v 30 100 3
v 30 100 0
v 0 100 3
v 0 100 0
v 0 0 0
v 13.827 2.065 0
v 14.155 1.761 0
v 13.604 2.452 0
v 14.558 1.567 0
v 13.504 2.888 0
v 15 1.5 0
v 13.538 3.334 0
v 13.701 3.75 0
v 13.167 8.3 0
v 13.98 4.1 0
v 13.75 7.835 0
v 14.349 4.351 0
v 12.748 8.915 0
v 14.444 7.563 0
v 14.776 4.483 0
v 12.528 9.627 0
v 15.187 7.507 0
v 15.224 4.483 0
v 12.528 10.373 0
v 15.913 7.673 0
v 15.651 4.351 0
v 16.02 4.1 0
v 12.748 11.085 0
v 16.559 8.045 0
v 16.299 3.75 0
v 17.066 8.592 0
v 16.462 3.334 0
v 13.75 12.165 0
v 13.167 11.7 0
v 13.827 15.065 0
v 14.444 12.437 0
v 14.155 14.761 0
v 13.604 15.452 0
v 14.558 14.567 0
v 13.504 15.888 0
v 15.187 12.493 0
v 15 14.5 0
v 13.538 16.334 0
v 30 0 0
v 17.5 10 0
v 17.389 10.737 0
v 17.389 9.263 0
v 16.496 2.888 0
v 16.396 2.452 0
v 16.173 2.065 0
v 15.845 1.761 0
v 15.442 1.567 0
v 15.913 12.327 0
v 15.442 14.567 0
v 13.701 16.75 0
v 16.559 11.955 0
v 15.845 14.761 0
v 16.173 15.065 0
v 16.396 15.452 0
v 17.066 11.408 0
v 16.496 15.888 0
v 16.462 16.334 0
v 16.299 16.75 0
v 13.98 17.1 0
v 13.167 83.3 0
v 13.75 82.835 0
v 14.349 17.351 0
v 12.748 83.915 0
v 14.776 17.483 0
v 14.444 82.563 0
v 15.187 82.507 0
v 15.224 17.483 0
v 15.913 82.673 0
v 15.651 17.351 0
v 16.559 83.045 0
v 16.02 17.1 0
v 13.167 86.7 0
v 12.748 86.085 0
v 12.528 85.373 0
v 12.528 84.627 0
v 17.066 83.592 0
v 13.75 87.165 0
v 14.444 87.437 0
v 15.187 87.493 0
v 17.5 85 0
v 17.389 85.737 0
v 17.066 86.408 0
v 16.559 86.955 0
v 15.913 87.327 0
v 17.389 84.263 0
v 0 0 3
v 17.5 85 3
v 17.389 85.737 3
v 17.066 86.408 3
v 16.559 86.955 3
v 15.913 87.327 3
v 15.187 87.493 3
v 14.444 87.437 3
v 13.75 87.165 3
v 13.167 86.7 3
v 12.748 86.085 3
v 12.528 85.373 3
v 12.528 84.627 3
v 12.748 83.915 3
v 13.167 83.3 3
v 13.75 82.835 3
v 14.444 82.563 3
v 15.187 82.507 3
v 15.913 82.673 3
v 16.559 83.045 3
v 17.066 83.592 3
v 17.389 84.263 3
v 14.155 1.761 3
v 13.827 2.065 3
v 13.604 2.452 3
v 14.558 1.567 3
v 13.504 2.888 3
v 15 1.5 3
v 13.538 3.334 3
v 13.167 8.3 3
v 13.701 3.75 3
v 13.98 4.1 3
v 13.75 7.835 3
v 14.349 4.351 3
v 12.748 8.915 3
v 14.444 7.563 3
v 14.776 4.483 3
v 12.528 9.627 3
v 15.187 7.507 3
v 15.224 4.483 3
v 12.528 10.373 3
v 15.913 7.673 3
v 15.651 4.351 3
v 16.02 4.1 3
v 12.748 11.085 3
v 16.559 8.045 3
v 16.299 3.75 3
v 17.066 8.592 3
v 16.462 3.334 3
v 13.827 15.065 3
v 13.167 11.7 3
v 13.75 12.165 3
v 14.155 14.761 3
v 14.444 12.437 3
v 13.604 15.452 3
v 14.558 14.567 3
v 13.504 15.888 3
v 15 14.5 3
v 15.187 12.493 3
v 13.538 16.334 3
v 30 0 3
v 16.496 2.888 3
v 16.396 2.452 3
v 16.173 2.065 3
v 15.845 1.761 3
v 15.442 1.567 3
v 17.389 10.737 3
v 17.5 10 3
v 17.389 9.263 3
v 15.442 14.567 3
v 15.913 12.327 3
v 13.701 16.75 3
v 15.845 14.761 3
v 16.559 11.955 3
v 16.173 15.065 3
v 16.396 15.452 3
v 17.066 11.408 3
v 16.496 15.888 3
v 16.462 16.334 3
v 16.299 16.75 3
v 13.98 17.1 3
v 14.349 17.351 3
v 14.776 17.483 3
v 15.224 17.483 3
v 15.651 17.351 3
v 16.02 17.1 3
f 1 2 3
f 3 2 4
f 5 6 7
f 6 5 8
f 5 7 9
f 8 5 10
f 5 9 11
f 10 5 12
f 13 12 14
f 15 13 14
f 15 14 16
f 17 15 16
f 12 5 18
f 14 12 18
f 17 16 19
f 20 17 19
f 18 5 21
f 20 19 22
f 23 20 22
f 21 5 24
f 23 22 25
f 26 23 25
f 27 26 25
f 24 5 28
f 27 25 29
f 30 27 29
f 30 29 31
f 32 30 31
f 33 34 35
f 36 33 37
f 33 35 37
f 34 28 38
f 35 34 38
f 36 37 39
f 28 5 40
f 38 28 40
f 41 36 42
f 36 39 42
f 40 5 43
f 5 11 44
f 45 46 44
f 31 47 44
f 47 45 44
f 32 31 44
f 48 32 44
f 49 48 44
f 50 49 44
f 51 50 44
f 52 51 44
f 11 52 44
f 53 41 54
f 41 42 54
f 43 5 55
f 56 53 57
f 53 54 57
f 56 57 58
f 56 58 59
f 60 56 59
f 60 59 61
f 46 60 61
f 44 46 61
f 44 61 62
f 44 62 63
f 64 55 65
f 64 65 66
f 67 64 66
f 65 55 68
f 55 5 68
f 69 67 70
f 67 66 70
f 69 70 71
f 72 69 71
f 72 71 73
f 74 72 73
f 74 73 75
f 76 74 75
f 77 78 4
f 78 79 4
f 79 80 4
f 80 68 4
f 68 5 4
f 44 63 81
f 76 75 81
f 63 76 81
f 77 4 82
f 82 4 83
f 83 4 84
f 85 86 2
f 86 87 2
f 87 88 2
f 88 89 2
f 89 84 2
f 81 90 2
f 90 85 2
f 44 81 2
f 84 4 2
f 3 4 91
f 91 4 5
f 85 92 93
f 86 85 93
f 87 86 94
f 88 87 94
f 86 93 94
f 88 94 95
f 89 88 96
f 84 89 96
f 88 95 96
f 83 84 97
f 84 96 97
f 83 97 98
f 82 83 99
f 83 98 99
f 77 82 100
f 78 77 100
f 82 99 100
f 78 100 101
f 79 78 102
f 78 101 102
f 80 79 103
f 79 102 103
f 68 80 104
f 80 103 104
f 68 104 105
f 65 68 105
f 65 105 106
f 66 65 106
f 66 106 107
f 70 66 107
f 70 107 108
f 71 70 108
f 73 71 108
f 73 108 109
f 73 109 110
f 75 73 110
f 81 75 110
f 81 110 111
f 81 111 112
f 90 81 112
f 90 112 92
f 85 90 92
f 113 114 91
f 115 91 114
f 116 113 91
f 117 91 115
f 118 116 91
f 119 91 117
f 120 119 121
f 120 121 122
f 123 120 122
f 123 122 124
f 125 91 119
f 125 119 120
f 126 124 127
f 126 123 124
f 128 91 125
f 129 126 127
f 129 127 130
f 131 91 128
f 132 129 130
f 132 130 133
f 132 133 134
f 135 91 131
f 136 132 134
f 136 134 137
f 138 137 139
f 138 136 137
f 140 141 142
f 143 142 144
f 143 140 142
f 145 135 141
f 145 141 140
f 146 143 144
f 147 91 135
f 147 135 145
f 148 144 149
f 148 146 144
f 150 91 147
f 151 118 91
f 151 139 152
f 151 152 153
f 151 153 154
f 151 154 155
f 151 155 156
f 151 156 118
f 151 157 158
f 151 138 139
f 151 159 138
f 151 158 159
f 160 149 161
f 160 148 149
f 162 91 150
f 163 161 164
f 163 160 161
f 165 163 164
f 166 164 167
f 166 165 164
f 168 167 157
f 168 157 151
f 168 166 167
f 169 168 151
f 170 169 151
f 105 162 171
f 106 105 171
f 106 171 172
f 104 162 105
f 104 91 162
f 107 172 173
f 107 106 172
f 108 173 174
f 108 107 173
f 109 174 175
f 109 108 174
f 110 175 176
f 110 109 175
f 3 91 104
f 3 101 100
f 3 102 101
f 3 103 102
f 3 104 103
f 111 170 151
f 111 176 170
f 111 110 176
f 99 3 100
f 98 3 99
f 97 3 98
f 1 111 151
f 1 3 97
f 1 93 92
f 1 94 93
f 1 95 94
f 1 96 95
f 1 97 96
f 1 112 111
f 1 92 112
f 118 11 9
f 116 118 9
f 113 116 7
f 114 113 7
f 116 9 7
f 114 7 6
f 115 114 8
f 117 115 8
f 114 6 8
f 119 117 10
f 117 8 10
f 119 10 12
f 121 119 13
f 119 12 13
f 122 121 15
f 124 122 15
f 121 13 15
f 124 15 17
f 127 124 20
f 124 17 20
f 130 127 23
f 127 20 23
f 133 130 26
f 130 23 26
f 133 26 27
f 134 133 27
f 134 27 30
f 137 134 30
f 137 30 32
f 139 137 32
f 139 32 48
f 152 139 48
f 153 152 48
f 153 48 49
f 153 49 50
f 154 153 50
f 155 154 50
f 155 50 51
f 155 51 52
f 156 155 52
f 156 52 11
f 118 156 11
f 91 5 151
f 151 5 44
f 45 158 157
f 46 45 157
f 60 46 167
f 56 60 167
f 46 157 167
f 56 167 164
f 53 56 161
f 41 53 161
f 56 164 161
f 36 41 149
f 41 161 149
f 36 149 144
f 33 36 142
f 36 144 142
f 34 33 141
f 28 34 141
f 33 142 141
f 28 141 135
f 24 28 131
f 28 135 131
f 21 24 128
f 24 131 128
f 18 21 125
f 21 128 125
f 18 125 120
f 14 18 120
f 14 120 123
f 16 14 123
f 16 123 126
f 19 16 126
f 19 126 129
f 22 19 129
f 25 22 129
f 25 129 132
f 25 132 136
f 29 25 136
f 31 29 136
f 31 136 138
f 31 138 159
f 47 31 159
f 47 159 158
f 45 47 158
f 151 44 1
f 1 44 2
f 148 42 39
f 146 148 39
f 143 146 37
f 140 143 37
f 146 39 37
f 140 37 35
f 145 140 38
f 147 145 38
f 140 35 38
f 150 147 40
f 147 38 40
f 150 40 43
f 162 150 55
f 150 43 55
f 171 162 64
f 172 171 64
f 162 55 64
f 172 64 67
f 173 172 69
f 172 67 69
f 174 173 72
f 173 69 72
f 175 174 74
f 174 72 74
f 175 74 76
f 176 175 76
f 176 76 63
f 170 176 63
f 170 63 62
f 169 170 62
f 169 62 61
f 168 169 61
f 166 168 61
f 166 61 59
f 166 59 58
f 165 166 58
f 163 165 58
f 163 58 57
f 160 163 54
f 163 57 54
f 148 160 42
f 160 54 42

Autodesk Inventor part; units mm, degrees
ref_plane "YZ Plane" through (0, 0, 0) normal (1, 0, 0) x (0, 1, 0)
ref_plane "XZ Plane" through (0, 0, 0) normal (0, 1, 0) x (-1, 0, 0)
ref_plane "XY Plane" through (0, 0, 0) normal (0, 0, 1) x (1, 0, 0)
sketch "スケッチ1" plane through (0, 0, 0) normal (0, 0, 1) x (1, 0, 0)
  line L0 (0, 0) -> (30, 0)
  line L1 (30, 0) -> (30, 100)
  line L2 (30, 100) -> (0, 100)
  line L3 (0, 100) -> (0, 0)
  dimension "d0" = 100
  dimension "d1" = 30
extrude "押し出し1" add sketch "スケッチ1" along normal blind 3
sketch "スケッチ3" plane through (0, 0, 3) normal (0, 0, 1) x (1, 0, 0)
  circle A0 centre (15, 85) radius 2.5
  line L0 (30, 100) -> (0, 100) projected
  line L1 (0, 100) -> (0, 0) projected
  point P0 (15, 100)
  dimension "d9" = 5
  dimension "d10" = 15
  dimension "d11" = 15
extrude "押し出し3" cut sketch "スケッチ3" against normal blind 10
sketch "スケッチ4" plane through (0, 0, 3) normal (0, 0, 1) x (1, 0, 0)
  circle A0 centre (15, 10) radius 2.5
  line L0 (0, 0) -> (30, 0) projected
  line L1 (30, 0) -> (30, 100) projected
  dimension "d14" = 5
  dimension "d15" = 10
  dimension "d16" = 15
extrude "押し出し4" cut sketch "スケッチ4" against normal blind 10
sketch "スケッチ5" plane through (0, 0, 3) normal (0, 0, 1) x (1, 0, 0)
  circle A0 centre (15, 10) radius 2.5 projected
  line L0 (15, 10) -> (15, 26.1579)
  line L1 (15, 26.1579) -> (15, -6.7471)
  line L2 (0, 0) -> (30, 0) projected
  point P0 (15, 16)
  point P1 (15, 3)
  dimension "d19" = 3
  dimension "d20" = 13
hole "穴1" at (15, 16, 3) at (15, 3, 3) direction (0, 0, -1) diameter 3 end through all
equation "\"d11\" = d10"
properties part number "practice_parts02"
